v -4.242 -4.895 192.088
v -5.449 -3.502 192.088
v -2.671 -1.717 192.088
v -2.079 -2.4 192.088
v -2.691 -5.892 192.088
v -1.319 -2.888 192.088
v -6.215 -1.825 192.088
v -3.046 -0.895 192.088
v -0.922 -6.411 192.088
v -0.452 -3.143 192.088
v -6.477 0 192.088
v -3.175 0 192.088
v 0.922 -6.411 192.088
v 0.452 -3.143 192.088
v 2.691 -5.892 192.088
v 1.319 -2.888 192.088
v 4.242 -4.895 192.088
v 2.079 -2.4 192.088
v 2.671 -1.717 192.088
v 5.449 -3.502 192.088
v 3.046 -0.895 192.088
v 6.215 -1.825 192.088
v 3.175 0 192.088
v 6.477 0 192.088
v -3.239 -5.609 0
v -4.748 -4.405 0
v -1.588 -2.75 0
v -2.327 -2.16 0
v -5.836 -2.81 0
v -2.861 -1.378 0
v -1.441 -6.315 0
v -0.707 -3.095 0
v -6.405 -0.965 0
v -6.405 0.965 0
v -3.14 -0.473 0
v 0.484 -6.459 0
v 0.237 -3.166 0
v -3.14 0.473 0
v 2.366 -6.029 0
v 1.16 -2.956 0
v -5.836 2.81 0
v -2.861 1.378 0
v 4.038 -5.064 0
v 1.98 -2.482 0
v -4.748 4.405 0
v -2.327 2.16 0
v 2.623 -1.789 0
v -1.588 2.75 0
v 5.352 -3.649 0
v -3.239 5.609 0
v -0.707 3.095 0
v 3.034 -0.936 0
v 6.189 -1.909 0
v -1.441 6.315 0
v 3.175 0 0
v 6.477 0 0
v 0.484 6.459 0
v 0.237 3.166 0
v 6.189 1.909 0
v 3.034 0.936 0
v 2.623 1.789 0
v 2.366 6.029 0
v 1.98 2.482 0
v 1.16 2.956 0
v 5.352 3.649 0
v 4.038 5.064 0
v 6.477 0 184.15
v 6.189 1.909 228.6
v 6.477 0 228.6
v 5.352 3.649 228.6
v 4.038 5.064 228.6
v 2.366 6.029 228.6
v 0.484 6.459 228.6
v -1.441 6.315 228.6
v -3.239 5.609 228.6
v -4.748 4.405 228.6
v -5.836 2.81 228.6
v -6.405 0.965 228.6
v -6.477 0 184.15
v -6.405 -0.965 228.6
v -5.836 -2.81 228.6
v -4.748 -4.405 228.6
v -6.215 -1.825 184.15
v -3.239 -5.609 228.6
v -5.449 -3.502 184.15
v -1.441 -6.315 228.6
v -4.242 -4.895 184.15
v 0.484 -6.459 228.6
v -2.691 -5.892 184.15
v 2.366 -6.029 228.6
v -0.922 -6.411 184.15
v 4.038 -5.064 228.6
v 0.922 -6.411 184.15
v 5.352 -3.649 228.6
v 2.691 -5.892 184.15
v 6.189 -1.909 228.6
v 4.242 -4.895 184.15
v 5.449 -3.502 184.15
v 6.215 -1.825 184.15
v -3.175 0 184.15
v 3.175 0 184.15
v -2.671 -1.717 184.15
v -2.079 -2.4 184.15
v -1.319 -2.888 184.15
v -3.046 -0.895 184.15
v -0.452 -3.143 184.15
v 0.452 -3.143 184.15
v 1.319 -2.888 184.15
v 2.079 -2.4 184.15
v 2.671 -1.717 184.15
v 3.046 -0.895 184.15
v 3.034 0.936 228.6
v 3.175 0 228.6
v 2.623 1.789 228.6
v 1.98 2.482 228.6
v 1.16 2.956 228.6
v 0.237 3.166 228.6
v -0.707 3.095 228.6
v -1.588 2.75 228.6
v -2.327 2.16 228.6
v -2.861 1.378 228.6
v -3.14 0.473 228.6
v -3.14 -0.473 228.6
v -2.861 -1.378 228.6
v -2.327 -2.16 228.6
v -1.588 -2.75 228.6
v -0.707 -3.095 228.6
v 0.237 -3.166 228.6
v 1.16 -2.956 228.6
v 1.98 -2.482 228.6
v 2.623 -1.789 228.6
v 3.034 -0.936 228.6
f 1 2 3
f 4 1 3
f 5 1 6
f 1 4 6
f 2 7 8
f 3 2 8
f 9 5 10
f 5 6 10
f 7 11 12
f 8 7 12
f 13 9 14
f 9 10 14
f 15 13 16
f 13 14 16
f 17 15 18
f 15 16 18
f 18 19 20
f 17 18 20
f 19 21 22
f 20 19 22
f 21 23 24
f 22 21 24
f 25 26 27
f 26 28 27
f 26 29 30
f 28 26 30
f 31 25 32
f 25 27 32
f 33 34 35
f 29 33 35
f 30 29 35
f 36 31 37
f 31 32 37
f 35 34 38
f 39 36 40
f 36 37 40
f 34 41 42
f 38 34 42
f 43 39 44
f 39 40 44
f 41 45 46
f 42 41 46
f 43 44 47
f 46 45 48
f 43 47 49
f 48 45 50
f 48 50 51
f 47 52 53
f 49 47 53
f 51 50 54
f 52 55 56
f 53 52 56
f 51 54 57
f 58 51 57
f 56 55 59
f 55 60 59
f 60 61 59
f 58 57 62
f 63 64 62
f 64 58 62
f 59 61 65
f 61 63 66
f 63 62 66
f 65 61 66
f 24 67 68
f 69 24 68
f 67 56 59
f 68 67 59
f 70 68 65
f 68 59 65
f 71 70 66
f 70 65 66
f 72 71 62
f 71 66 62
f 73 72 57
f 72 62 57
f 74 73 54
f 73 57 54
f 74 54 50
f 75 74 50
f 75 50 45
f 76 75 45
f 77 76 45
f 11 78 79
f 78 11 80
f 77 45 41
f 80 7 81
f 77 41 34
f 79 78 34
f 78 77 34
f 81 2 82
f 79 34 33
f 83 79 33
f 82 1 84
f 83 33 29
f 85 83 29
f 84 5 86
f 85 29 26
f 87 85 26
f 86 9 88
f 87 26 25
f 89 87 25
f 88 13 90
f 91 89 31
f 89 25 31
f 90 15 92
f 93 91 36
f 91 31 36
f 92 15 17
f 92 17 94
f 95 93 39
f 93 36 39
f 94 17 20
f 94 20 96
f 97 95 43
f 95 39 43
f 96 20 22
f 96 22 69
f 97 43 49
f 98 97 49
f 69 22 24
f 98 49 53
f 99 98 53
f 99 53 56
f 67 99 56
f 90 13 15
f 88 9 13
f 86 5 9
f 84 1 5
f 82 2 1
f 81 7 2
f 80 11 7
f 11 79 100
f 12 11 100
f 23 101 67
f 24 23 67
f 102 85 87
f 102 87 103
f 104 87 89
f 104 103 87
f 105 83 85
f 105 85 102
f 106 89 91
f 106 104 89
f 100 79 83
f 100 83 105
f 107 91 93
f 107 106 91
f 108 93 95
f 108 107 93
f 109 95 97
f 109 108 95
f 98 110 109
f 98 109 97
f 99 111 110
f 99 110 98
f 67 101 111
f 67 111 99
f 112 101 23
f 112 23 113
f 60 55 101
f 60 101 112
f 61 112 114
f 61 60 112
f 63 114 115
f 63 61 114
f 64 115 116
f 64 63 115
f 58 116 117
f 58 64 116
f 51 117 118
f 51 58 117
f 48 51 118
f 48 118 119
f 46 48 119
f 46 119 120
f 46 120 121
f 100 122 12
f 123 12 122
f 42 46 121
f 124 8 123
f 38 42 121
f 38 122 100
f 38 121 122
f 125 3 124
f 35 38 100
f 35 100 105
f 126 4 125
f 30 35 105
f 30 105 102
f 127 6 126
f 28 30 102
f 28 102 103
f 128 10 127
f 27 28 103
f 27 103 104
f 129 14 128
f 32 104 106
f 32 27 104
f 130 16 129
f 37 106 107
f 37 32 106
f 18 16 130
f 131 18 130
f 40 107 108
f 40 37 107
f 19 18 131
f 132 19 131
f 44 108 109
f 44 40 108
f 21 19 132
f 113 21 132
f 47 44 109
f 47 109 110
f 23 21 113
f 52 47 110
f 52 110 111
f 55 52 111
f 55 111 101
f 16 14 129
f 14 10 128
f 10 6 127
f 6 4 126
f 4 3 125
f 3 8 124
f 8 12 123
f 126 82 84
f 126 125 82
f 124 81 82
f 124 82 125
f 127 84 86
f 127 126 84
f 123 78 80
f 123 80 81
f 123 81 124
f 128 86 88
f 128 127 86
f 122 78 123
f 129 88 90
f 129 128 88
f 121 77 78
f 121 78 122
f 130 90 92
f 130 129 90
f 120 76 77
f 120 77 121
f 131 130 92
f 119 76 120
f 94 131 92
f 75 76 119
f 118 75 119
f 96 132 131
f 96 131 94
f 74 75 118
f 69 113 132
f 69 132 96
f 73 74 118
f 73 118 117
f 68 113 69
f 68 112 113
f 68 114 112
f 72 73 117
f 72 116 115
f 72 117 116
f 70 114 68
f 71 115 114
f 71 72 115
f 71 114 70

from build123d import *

# Parameters (mm, degrees)
SKETCH1_R           = 6.477
SKETCH1_R_2         = 3.175
BOSS_EXTRUDE1_DEPTH = 228.6
SKETCH2_W           = 12.954
SKETCH2_H           = 7.9375
CUT_EXTRUDE1_DEPTH  = 229.783441398


with BuildPart() as part:
    # Sketch1 → Boss-Extrude1 (new body)
    with BuildSketch(Plane.XY):
        Circle(SKETCH1_R)
        Circle(SKETCH1_R_2, mode=Mode.SUBTRACT)
    extrude(amount=BOSS_EXTRUDE1_DEPTH)

    # Sketch2 → Cut-Extrude1 (cut, through all)
    with BuildSketch(Plane(origin=(0, 0, 0), x_dir=(1, 0, 0), z_dir=(0, 1, 0))):
        with Locations((0, -188.11875)):
            Rectangle(SKETCH2_W, SKETCH2_H)
    extrude(amount=-CUT_EXTRUDE1_DEPTH, mode=Mode.SUBTRACT)


solid = part.part
